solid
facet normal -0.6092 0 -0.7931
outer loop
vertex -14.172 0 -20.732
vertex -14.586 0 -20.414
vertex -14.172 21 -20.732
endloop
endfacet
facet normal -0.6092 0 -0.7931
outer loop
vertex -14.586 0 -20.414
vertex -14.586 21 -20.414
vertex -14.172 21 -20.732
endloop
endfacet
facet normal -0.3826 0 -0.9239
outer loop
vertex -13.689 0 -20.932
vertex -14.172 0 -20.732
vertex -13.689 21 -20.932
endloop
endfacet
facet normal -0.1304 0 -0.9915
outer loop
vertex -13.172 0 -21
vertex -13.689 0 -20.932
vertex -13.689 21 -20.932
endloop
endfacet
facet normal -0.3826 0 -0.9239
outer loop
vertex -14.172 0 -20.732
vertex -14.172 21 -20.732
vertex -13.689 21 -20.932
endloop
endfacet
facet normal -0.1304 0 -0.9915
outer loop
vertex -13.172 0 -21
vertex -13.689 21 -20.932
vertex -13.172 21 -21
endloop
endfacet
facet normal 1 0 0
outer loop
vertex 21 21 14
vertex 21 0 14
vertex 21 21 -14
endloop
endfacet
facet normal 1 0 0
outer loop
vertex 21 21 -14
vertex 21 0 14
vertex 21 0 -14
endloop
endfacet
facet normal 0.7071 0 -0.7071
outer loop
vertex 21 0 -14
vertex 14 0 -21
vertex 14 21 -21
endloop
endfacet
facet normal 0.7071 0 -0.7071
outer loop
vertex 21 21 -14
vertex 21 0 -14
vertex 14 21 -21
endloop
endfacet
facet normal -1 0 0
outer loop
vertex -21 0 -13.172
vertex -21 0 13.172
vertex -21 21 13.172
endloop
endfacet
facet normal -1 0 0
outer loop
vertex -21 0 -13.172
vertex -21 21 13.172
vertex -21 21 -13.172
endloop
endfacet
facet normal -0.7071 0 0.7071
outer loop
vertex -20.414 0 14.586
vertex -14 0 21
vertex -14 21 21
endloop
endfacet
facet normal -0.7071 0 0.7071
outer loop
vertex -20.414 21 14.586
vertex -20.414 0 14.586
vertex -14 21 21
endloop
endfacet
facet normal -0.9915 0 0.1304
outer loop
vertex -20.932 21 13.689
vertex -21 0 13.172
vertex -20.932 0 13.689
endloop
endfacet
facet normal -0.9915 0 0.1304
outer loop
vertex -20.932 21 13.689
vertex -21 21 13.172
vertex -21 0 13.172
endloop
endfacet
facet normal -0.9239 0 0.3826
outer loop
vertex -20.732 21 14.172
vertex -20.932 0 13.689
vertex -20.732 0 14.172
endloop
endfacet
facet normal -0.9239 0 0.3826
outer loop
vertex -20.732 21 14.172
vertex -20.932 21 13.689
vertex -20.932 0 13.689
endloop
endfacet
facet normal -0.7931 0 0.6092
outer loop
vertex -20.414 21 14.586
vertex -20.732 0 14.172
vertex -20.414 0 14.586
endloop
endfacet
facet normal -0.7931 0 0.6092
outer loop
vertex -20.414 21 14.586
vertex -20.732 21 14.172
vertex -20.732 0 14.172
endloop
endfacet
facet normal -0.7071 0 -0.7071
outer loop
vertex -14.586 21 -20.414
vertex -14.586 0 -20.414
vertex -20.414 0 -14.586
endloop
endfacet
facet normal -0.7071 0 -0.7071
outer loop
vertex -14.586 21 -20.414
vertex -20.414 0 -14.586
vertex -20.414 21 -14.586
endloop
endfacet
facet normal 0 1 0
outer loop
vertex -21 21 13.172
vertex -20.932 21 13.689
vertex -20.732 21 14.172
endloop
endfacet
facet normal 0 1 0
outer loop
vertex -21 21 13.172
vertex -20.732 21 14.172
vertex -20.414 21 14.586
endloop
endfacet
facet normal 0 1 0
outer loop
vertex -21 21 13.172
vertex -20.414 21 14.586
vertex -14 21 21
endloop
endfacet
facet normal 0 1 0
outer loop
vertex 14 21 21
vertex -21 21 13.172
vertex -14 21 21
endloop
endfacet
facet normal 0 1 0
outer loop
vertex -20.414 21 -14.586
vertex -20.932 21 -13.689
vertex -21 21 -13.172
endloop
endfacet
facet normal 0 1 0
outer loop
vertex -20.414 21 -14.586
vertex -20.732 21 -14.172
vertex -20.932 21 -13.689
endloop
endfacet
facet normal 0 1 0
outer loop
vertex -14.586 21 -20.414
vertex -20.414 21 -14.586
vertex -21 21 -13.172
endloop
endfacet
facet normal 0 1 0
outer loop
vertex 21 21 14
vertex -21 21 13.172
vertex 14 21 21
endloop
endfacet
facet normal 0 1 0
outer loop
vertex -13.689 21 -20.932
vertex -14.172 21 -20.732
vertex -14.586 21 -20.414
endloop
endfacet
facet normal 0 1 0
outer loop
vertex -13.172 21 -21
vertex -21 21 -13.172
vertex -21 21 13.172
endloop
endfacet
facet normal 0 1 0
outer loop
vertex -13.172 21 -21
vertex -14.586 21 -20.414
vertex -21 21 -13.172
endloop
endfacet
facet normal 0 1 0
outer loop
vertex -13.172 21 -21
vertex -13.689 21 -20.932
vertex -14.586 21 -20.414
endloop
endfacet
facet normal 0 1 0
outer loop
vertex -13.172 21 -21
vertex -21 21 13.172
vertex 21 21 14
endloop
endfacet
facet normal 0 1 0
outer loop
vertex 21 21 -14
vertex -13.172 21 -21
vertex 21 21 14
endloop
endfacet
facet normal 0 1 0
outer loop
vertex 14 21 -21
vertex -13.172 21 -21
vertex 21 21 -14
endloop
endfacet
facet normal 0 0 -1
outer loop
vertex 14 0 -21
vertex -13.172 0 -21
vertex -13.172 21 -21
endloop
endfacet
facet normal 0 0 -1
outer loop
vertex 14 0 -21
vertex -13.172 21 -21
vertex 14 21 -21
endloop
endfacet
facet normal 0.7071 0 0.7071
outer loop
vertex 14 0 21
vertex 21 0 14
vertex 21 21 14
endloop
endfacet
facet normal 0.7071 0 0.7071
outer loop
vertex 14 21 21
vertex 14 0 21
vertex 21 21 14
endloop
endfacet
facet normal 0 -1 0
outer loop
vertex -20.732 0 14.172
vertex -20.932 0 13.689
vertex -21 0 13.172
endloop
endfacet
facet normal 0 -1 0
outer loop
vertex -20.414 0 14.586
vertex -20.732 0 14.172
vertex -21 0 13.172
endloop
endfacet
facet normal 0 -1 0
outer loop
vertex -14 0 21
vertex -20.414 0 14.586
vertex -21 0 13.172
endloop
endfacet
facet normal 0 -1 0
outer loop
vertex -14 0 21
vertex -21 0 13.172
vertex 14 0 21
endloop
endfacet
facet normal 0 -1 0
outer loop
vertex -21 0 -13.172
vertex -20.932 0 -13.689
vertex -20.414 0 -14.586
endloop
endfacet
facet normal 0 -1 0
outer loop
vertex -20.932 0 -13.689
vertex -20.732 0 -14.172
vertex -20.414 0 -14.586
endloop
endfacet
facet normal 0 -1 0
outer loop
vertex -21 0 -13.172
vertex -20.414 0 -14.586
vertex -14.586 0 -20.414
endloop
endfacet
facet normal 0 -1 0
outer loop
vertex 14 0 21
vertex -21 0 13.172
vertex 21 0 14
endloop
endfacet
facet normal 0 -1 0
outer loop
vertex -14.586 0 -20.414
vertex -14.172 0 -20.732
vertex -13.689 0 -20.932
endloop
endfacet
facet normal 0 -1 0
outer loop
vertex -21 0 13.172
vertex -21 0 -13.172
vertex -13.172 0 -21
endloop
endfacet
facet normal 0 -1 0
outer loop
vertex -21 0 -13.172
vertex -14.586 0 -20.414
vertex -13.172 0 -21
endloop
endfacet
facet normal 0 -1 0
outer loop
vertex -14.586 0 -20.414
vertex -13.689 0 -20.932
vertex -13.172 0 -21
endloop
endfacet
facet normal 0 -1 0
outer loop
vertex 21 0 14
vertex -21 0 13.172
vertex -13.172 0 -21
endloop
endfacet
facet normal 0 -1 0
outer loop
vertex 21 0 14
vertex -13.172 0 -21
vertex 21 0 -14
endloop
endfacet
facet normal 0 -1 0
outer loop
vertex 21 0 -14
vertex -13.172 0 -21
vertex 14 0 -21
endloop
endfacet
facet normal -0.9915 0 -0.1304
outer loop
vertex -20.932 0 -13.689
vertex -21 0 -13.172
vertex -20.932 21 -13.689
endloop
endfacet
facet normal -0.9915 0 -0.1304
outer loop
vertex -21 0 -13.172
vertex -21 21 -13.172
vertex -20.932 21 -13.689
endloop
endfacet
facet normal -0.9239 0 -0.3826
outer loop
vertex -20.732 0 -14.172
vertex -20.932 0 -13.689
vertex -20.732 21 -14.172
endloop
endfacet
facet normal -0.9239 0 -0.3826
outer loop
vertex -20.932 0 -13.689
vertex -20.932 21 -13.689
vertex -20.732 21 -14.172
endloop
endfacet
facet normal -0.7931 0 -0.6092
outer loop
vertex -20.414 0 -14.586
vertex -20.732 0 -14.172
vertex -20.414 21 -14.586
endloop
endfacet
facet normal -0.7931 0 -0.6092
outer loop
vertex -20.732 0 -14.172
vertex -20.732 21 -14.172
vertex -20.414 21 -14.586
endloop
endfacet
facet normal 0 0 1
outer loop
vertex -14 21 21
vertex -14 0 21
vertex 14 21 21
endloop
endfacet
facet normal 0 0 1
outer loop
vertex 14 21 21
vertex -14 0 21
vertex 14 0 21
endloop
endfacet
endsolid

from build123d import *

# Parameters (mm, degrees)
SKETCH1_W           = 42
SKETCH1_H           = 42
BOSS_EXTRUDE1_DEPTH = 21
CHAMFER1_SIZE       = 7
FILLET1_R           = 2


with BuildPart() as part:
    # Sketch1 → Boss-Extrude1 (new body)
    with BuildSketch(Plane(origin=(0, 0, 0), x_dir=(1, 0, 0), z_dir=(0, 1, 0))):
        Rectangle(SKETCH1_W, SKETCH1_H)
    extrude(amount=BOSS_EXTRUDE1_DEPTH)

    # Chamfer1
    chamfer1_edges = [part.edges().sort_by_distance(p)[0] for p in [
        (-21, 10.5, -21),
        (21, 10.5, -21),
        (21, 10.5, 21),
        (-21, 10.5, 21),
    ]]
    chamfer(chamfer1_edges, length=CHAMFER1_SIZE)

    # Fillet1
    fillet1_edges = [part.edges().sort_by_distance(p)[0] for p in [
        (-21, 10.5, 14),
        (-21, 10.5, -14),
        (-14, 10.5, -21),
    ]]
    fillet(fillet1_edges, radius=FILLET1_R)


solid = part.part
